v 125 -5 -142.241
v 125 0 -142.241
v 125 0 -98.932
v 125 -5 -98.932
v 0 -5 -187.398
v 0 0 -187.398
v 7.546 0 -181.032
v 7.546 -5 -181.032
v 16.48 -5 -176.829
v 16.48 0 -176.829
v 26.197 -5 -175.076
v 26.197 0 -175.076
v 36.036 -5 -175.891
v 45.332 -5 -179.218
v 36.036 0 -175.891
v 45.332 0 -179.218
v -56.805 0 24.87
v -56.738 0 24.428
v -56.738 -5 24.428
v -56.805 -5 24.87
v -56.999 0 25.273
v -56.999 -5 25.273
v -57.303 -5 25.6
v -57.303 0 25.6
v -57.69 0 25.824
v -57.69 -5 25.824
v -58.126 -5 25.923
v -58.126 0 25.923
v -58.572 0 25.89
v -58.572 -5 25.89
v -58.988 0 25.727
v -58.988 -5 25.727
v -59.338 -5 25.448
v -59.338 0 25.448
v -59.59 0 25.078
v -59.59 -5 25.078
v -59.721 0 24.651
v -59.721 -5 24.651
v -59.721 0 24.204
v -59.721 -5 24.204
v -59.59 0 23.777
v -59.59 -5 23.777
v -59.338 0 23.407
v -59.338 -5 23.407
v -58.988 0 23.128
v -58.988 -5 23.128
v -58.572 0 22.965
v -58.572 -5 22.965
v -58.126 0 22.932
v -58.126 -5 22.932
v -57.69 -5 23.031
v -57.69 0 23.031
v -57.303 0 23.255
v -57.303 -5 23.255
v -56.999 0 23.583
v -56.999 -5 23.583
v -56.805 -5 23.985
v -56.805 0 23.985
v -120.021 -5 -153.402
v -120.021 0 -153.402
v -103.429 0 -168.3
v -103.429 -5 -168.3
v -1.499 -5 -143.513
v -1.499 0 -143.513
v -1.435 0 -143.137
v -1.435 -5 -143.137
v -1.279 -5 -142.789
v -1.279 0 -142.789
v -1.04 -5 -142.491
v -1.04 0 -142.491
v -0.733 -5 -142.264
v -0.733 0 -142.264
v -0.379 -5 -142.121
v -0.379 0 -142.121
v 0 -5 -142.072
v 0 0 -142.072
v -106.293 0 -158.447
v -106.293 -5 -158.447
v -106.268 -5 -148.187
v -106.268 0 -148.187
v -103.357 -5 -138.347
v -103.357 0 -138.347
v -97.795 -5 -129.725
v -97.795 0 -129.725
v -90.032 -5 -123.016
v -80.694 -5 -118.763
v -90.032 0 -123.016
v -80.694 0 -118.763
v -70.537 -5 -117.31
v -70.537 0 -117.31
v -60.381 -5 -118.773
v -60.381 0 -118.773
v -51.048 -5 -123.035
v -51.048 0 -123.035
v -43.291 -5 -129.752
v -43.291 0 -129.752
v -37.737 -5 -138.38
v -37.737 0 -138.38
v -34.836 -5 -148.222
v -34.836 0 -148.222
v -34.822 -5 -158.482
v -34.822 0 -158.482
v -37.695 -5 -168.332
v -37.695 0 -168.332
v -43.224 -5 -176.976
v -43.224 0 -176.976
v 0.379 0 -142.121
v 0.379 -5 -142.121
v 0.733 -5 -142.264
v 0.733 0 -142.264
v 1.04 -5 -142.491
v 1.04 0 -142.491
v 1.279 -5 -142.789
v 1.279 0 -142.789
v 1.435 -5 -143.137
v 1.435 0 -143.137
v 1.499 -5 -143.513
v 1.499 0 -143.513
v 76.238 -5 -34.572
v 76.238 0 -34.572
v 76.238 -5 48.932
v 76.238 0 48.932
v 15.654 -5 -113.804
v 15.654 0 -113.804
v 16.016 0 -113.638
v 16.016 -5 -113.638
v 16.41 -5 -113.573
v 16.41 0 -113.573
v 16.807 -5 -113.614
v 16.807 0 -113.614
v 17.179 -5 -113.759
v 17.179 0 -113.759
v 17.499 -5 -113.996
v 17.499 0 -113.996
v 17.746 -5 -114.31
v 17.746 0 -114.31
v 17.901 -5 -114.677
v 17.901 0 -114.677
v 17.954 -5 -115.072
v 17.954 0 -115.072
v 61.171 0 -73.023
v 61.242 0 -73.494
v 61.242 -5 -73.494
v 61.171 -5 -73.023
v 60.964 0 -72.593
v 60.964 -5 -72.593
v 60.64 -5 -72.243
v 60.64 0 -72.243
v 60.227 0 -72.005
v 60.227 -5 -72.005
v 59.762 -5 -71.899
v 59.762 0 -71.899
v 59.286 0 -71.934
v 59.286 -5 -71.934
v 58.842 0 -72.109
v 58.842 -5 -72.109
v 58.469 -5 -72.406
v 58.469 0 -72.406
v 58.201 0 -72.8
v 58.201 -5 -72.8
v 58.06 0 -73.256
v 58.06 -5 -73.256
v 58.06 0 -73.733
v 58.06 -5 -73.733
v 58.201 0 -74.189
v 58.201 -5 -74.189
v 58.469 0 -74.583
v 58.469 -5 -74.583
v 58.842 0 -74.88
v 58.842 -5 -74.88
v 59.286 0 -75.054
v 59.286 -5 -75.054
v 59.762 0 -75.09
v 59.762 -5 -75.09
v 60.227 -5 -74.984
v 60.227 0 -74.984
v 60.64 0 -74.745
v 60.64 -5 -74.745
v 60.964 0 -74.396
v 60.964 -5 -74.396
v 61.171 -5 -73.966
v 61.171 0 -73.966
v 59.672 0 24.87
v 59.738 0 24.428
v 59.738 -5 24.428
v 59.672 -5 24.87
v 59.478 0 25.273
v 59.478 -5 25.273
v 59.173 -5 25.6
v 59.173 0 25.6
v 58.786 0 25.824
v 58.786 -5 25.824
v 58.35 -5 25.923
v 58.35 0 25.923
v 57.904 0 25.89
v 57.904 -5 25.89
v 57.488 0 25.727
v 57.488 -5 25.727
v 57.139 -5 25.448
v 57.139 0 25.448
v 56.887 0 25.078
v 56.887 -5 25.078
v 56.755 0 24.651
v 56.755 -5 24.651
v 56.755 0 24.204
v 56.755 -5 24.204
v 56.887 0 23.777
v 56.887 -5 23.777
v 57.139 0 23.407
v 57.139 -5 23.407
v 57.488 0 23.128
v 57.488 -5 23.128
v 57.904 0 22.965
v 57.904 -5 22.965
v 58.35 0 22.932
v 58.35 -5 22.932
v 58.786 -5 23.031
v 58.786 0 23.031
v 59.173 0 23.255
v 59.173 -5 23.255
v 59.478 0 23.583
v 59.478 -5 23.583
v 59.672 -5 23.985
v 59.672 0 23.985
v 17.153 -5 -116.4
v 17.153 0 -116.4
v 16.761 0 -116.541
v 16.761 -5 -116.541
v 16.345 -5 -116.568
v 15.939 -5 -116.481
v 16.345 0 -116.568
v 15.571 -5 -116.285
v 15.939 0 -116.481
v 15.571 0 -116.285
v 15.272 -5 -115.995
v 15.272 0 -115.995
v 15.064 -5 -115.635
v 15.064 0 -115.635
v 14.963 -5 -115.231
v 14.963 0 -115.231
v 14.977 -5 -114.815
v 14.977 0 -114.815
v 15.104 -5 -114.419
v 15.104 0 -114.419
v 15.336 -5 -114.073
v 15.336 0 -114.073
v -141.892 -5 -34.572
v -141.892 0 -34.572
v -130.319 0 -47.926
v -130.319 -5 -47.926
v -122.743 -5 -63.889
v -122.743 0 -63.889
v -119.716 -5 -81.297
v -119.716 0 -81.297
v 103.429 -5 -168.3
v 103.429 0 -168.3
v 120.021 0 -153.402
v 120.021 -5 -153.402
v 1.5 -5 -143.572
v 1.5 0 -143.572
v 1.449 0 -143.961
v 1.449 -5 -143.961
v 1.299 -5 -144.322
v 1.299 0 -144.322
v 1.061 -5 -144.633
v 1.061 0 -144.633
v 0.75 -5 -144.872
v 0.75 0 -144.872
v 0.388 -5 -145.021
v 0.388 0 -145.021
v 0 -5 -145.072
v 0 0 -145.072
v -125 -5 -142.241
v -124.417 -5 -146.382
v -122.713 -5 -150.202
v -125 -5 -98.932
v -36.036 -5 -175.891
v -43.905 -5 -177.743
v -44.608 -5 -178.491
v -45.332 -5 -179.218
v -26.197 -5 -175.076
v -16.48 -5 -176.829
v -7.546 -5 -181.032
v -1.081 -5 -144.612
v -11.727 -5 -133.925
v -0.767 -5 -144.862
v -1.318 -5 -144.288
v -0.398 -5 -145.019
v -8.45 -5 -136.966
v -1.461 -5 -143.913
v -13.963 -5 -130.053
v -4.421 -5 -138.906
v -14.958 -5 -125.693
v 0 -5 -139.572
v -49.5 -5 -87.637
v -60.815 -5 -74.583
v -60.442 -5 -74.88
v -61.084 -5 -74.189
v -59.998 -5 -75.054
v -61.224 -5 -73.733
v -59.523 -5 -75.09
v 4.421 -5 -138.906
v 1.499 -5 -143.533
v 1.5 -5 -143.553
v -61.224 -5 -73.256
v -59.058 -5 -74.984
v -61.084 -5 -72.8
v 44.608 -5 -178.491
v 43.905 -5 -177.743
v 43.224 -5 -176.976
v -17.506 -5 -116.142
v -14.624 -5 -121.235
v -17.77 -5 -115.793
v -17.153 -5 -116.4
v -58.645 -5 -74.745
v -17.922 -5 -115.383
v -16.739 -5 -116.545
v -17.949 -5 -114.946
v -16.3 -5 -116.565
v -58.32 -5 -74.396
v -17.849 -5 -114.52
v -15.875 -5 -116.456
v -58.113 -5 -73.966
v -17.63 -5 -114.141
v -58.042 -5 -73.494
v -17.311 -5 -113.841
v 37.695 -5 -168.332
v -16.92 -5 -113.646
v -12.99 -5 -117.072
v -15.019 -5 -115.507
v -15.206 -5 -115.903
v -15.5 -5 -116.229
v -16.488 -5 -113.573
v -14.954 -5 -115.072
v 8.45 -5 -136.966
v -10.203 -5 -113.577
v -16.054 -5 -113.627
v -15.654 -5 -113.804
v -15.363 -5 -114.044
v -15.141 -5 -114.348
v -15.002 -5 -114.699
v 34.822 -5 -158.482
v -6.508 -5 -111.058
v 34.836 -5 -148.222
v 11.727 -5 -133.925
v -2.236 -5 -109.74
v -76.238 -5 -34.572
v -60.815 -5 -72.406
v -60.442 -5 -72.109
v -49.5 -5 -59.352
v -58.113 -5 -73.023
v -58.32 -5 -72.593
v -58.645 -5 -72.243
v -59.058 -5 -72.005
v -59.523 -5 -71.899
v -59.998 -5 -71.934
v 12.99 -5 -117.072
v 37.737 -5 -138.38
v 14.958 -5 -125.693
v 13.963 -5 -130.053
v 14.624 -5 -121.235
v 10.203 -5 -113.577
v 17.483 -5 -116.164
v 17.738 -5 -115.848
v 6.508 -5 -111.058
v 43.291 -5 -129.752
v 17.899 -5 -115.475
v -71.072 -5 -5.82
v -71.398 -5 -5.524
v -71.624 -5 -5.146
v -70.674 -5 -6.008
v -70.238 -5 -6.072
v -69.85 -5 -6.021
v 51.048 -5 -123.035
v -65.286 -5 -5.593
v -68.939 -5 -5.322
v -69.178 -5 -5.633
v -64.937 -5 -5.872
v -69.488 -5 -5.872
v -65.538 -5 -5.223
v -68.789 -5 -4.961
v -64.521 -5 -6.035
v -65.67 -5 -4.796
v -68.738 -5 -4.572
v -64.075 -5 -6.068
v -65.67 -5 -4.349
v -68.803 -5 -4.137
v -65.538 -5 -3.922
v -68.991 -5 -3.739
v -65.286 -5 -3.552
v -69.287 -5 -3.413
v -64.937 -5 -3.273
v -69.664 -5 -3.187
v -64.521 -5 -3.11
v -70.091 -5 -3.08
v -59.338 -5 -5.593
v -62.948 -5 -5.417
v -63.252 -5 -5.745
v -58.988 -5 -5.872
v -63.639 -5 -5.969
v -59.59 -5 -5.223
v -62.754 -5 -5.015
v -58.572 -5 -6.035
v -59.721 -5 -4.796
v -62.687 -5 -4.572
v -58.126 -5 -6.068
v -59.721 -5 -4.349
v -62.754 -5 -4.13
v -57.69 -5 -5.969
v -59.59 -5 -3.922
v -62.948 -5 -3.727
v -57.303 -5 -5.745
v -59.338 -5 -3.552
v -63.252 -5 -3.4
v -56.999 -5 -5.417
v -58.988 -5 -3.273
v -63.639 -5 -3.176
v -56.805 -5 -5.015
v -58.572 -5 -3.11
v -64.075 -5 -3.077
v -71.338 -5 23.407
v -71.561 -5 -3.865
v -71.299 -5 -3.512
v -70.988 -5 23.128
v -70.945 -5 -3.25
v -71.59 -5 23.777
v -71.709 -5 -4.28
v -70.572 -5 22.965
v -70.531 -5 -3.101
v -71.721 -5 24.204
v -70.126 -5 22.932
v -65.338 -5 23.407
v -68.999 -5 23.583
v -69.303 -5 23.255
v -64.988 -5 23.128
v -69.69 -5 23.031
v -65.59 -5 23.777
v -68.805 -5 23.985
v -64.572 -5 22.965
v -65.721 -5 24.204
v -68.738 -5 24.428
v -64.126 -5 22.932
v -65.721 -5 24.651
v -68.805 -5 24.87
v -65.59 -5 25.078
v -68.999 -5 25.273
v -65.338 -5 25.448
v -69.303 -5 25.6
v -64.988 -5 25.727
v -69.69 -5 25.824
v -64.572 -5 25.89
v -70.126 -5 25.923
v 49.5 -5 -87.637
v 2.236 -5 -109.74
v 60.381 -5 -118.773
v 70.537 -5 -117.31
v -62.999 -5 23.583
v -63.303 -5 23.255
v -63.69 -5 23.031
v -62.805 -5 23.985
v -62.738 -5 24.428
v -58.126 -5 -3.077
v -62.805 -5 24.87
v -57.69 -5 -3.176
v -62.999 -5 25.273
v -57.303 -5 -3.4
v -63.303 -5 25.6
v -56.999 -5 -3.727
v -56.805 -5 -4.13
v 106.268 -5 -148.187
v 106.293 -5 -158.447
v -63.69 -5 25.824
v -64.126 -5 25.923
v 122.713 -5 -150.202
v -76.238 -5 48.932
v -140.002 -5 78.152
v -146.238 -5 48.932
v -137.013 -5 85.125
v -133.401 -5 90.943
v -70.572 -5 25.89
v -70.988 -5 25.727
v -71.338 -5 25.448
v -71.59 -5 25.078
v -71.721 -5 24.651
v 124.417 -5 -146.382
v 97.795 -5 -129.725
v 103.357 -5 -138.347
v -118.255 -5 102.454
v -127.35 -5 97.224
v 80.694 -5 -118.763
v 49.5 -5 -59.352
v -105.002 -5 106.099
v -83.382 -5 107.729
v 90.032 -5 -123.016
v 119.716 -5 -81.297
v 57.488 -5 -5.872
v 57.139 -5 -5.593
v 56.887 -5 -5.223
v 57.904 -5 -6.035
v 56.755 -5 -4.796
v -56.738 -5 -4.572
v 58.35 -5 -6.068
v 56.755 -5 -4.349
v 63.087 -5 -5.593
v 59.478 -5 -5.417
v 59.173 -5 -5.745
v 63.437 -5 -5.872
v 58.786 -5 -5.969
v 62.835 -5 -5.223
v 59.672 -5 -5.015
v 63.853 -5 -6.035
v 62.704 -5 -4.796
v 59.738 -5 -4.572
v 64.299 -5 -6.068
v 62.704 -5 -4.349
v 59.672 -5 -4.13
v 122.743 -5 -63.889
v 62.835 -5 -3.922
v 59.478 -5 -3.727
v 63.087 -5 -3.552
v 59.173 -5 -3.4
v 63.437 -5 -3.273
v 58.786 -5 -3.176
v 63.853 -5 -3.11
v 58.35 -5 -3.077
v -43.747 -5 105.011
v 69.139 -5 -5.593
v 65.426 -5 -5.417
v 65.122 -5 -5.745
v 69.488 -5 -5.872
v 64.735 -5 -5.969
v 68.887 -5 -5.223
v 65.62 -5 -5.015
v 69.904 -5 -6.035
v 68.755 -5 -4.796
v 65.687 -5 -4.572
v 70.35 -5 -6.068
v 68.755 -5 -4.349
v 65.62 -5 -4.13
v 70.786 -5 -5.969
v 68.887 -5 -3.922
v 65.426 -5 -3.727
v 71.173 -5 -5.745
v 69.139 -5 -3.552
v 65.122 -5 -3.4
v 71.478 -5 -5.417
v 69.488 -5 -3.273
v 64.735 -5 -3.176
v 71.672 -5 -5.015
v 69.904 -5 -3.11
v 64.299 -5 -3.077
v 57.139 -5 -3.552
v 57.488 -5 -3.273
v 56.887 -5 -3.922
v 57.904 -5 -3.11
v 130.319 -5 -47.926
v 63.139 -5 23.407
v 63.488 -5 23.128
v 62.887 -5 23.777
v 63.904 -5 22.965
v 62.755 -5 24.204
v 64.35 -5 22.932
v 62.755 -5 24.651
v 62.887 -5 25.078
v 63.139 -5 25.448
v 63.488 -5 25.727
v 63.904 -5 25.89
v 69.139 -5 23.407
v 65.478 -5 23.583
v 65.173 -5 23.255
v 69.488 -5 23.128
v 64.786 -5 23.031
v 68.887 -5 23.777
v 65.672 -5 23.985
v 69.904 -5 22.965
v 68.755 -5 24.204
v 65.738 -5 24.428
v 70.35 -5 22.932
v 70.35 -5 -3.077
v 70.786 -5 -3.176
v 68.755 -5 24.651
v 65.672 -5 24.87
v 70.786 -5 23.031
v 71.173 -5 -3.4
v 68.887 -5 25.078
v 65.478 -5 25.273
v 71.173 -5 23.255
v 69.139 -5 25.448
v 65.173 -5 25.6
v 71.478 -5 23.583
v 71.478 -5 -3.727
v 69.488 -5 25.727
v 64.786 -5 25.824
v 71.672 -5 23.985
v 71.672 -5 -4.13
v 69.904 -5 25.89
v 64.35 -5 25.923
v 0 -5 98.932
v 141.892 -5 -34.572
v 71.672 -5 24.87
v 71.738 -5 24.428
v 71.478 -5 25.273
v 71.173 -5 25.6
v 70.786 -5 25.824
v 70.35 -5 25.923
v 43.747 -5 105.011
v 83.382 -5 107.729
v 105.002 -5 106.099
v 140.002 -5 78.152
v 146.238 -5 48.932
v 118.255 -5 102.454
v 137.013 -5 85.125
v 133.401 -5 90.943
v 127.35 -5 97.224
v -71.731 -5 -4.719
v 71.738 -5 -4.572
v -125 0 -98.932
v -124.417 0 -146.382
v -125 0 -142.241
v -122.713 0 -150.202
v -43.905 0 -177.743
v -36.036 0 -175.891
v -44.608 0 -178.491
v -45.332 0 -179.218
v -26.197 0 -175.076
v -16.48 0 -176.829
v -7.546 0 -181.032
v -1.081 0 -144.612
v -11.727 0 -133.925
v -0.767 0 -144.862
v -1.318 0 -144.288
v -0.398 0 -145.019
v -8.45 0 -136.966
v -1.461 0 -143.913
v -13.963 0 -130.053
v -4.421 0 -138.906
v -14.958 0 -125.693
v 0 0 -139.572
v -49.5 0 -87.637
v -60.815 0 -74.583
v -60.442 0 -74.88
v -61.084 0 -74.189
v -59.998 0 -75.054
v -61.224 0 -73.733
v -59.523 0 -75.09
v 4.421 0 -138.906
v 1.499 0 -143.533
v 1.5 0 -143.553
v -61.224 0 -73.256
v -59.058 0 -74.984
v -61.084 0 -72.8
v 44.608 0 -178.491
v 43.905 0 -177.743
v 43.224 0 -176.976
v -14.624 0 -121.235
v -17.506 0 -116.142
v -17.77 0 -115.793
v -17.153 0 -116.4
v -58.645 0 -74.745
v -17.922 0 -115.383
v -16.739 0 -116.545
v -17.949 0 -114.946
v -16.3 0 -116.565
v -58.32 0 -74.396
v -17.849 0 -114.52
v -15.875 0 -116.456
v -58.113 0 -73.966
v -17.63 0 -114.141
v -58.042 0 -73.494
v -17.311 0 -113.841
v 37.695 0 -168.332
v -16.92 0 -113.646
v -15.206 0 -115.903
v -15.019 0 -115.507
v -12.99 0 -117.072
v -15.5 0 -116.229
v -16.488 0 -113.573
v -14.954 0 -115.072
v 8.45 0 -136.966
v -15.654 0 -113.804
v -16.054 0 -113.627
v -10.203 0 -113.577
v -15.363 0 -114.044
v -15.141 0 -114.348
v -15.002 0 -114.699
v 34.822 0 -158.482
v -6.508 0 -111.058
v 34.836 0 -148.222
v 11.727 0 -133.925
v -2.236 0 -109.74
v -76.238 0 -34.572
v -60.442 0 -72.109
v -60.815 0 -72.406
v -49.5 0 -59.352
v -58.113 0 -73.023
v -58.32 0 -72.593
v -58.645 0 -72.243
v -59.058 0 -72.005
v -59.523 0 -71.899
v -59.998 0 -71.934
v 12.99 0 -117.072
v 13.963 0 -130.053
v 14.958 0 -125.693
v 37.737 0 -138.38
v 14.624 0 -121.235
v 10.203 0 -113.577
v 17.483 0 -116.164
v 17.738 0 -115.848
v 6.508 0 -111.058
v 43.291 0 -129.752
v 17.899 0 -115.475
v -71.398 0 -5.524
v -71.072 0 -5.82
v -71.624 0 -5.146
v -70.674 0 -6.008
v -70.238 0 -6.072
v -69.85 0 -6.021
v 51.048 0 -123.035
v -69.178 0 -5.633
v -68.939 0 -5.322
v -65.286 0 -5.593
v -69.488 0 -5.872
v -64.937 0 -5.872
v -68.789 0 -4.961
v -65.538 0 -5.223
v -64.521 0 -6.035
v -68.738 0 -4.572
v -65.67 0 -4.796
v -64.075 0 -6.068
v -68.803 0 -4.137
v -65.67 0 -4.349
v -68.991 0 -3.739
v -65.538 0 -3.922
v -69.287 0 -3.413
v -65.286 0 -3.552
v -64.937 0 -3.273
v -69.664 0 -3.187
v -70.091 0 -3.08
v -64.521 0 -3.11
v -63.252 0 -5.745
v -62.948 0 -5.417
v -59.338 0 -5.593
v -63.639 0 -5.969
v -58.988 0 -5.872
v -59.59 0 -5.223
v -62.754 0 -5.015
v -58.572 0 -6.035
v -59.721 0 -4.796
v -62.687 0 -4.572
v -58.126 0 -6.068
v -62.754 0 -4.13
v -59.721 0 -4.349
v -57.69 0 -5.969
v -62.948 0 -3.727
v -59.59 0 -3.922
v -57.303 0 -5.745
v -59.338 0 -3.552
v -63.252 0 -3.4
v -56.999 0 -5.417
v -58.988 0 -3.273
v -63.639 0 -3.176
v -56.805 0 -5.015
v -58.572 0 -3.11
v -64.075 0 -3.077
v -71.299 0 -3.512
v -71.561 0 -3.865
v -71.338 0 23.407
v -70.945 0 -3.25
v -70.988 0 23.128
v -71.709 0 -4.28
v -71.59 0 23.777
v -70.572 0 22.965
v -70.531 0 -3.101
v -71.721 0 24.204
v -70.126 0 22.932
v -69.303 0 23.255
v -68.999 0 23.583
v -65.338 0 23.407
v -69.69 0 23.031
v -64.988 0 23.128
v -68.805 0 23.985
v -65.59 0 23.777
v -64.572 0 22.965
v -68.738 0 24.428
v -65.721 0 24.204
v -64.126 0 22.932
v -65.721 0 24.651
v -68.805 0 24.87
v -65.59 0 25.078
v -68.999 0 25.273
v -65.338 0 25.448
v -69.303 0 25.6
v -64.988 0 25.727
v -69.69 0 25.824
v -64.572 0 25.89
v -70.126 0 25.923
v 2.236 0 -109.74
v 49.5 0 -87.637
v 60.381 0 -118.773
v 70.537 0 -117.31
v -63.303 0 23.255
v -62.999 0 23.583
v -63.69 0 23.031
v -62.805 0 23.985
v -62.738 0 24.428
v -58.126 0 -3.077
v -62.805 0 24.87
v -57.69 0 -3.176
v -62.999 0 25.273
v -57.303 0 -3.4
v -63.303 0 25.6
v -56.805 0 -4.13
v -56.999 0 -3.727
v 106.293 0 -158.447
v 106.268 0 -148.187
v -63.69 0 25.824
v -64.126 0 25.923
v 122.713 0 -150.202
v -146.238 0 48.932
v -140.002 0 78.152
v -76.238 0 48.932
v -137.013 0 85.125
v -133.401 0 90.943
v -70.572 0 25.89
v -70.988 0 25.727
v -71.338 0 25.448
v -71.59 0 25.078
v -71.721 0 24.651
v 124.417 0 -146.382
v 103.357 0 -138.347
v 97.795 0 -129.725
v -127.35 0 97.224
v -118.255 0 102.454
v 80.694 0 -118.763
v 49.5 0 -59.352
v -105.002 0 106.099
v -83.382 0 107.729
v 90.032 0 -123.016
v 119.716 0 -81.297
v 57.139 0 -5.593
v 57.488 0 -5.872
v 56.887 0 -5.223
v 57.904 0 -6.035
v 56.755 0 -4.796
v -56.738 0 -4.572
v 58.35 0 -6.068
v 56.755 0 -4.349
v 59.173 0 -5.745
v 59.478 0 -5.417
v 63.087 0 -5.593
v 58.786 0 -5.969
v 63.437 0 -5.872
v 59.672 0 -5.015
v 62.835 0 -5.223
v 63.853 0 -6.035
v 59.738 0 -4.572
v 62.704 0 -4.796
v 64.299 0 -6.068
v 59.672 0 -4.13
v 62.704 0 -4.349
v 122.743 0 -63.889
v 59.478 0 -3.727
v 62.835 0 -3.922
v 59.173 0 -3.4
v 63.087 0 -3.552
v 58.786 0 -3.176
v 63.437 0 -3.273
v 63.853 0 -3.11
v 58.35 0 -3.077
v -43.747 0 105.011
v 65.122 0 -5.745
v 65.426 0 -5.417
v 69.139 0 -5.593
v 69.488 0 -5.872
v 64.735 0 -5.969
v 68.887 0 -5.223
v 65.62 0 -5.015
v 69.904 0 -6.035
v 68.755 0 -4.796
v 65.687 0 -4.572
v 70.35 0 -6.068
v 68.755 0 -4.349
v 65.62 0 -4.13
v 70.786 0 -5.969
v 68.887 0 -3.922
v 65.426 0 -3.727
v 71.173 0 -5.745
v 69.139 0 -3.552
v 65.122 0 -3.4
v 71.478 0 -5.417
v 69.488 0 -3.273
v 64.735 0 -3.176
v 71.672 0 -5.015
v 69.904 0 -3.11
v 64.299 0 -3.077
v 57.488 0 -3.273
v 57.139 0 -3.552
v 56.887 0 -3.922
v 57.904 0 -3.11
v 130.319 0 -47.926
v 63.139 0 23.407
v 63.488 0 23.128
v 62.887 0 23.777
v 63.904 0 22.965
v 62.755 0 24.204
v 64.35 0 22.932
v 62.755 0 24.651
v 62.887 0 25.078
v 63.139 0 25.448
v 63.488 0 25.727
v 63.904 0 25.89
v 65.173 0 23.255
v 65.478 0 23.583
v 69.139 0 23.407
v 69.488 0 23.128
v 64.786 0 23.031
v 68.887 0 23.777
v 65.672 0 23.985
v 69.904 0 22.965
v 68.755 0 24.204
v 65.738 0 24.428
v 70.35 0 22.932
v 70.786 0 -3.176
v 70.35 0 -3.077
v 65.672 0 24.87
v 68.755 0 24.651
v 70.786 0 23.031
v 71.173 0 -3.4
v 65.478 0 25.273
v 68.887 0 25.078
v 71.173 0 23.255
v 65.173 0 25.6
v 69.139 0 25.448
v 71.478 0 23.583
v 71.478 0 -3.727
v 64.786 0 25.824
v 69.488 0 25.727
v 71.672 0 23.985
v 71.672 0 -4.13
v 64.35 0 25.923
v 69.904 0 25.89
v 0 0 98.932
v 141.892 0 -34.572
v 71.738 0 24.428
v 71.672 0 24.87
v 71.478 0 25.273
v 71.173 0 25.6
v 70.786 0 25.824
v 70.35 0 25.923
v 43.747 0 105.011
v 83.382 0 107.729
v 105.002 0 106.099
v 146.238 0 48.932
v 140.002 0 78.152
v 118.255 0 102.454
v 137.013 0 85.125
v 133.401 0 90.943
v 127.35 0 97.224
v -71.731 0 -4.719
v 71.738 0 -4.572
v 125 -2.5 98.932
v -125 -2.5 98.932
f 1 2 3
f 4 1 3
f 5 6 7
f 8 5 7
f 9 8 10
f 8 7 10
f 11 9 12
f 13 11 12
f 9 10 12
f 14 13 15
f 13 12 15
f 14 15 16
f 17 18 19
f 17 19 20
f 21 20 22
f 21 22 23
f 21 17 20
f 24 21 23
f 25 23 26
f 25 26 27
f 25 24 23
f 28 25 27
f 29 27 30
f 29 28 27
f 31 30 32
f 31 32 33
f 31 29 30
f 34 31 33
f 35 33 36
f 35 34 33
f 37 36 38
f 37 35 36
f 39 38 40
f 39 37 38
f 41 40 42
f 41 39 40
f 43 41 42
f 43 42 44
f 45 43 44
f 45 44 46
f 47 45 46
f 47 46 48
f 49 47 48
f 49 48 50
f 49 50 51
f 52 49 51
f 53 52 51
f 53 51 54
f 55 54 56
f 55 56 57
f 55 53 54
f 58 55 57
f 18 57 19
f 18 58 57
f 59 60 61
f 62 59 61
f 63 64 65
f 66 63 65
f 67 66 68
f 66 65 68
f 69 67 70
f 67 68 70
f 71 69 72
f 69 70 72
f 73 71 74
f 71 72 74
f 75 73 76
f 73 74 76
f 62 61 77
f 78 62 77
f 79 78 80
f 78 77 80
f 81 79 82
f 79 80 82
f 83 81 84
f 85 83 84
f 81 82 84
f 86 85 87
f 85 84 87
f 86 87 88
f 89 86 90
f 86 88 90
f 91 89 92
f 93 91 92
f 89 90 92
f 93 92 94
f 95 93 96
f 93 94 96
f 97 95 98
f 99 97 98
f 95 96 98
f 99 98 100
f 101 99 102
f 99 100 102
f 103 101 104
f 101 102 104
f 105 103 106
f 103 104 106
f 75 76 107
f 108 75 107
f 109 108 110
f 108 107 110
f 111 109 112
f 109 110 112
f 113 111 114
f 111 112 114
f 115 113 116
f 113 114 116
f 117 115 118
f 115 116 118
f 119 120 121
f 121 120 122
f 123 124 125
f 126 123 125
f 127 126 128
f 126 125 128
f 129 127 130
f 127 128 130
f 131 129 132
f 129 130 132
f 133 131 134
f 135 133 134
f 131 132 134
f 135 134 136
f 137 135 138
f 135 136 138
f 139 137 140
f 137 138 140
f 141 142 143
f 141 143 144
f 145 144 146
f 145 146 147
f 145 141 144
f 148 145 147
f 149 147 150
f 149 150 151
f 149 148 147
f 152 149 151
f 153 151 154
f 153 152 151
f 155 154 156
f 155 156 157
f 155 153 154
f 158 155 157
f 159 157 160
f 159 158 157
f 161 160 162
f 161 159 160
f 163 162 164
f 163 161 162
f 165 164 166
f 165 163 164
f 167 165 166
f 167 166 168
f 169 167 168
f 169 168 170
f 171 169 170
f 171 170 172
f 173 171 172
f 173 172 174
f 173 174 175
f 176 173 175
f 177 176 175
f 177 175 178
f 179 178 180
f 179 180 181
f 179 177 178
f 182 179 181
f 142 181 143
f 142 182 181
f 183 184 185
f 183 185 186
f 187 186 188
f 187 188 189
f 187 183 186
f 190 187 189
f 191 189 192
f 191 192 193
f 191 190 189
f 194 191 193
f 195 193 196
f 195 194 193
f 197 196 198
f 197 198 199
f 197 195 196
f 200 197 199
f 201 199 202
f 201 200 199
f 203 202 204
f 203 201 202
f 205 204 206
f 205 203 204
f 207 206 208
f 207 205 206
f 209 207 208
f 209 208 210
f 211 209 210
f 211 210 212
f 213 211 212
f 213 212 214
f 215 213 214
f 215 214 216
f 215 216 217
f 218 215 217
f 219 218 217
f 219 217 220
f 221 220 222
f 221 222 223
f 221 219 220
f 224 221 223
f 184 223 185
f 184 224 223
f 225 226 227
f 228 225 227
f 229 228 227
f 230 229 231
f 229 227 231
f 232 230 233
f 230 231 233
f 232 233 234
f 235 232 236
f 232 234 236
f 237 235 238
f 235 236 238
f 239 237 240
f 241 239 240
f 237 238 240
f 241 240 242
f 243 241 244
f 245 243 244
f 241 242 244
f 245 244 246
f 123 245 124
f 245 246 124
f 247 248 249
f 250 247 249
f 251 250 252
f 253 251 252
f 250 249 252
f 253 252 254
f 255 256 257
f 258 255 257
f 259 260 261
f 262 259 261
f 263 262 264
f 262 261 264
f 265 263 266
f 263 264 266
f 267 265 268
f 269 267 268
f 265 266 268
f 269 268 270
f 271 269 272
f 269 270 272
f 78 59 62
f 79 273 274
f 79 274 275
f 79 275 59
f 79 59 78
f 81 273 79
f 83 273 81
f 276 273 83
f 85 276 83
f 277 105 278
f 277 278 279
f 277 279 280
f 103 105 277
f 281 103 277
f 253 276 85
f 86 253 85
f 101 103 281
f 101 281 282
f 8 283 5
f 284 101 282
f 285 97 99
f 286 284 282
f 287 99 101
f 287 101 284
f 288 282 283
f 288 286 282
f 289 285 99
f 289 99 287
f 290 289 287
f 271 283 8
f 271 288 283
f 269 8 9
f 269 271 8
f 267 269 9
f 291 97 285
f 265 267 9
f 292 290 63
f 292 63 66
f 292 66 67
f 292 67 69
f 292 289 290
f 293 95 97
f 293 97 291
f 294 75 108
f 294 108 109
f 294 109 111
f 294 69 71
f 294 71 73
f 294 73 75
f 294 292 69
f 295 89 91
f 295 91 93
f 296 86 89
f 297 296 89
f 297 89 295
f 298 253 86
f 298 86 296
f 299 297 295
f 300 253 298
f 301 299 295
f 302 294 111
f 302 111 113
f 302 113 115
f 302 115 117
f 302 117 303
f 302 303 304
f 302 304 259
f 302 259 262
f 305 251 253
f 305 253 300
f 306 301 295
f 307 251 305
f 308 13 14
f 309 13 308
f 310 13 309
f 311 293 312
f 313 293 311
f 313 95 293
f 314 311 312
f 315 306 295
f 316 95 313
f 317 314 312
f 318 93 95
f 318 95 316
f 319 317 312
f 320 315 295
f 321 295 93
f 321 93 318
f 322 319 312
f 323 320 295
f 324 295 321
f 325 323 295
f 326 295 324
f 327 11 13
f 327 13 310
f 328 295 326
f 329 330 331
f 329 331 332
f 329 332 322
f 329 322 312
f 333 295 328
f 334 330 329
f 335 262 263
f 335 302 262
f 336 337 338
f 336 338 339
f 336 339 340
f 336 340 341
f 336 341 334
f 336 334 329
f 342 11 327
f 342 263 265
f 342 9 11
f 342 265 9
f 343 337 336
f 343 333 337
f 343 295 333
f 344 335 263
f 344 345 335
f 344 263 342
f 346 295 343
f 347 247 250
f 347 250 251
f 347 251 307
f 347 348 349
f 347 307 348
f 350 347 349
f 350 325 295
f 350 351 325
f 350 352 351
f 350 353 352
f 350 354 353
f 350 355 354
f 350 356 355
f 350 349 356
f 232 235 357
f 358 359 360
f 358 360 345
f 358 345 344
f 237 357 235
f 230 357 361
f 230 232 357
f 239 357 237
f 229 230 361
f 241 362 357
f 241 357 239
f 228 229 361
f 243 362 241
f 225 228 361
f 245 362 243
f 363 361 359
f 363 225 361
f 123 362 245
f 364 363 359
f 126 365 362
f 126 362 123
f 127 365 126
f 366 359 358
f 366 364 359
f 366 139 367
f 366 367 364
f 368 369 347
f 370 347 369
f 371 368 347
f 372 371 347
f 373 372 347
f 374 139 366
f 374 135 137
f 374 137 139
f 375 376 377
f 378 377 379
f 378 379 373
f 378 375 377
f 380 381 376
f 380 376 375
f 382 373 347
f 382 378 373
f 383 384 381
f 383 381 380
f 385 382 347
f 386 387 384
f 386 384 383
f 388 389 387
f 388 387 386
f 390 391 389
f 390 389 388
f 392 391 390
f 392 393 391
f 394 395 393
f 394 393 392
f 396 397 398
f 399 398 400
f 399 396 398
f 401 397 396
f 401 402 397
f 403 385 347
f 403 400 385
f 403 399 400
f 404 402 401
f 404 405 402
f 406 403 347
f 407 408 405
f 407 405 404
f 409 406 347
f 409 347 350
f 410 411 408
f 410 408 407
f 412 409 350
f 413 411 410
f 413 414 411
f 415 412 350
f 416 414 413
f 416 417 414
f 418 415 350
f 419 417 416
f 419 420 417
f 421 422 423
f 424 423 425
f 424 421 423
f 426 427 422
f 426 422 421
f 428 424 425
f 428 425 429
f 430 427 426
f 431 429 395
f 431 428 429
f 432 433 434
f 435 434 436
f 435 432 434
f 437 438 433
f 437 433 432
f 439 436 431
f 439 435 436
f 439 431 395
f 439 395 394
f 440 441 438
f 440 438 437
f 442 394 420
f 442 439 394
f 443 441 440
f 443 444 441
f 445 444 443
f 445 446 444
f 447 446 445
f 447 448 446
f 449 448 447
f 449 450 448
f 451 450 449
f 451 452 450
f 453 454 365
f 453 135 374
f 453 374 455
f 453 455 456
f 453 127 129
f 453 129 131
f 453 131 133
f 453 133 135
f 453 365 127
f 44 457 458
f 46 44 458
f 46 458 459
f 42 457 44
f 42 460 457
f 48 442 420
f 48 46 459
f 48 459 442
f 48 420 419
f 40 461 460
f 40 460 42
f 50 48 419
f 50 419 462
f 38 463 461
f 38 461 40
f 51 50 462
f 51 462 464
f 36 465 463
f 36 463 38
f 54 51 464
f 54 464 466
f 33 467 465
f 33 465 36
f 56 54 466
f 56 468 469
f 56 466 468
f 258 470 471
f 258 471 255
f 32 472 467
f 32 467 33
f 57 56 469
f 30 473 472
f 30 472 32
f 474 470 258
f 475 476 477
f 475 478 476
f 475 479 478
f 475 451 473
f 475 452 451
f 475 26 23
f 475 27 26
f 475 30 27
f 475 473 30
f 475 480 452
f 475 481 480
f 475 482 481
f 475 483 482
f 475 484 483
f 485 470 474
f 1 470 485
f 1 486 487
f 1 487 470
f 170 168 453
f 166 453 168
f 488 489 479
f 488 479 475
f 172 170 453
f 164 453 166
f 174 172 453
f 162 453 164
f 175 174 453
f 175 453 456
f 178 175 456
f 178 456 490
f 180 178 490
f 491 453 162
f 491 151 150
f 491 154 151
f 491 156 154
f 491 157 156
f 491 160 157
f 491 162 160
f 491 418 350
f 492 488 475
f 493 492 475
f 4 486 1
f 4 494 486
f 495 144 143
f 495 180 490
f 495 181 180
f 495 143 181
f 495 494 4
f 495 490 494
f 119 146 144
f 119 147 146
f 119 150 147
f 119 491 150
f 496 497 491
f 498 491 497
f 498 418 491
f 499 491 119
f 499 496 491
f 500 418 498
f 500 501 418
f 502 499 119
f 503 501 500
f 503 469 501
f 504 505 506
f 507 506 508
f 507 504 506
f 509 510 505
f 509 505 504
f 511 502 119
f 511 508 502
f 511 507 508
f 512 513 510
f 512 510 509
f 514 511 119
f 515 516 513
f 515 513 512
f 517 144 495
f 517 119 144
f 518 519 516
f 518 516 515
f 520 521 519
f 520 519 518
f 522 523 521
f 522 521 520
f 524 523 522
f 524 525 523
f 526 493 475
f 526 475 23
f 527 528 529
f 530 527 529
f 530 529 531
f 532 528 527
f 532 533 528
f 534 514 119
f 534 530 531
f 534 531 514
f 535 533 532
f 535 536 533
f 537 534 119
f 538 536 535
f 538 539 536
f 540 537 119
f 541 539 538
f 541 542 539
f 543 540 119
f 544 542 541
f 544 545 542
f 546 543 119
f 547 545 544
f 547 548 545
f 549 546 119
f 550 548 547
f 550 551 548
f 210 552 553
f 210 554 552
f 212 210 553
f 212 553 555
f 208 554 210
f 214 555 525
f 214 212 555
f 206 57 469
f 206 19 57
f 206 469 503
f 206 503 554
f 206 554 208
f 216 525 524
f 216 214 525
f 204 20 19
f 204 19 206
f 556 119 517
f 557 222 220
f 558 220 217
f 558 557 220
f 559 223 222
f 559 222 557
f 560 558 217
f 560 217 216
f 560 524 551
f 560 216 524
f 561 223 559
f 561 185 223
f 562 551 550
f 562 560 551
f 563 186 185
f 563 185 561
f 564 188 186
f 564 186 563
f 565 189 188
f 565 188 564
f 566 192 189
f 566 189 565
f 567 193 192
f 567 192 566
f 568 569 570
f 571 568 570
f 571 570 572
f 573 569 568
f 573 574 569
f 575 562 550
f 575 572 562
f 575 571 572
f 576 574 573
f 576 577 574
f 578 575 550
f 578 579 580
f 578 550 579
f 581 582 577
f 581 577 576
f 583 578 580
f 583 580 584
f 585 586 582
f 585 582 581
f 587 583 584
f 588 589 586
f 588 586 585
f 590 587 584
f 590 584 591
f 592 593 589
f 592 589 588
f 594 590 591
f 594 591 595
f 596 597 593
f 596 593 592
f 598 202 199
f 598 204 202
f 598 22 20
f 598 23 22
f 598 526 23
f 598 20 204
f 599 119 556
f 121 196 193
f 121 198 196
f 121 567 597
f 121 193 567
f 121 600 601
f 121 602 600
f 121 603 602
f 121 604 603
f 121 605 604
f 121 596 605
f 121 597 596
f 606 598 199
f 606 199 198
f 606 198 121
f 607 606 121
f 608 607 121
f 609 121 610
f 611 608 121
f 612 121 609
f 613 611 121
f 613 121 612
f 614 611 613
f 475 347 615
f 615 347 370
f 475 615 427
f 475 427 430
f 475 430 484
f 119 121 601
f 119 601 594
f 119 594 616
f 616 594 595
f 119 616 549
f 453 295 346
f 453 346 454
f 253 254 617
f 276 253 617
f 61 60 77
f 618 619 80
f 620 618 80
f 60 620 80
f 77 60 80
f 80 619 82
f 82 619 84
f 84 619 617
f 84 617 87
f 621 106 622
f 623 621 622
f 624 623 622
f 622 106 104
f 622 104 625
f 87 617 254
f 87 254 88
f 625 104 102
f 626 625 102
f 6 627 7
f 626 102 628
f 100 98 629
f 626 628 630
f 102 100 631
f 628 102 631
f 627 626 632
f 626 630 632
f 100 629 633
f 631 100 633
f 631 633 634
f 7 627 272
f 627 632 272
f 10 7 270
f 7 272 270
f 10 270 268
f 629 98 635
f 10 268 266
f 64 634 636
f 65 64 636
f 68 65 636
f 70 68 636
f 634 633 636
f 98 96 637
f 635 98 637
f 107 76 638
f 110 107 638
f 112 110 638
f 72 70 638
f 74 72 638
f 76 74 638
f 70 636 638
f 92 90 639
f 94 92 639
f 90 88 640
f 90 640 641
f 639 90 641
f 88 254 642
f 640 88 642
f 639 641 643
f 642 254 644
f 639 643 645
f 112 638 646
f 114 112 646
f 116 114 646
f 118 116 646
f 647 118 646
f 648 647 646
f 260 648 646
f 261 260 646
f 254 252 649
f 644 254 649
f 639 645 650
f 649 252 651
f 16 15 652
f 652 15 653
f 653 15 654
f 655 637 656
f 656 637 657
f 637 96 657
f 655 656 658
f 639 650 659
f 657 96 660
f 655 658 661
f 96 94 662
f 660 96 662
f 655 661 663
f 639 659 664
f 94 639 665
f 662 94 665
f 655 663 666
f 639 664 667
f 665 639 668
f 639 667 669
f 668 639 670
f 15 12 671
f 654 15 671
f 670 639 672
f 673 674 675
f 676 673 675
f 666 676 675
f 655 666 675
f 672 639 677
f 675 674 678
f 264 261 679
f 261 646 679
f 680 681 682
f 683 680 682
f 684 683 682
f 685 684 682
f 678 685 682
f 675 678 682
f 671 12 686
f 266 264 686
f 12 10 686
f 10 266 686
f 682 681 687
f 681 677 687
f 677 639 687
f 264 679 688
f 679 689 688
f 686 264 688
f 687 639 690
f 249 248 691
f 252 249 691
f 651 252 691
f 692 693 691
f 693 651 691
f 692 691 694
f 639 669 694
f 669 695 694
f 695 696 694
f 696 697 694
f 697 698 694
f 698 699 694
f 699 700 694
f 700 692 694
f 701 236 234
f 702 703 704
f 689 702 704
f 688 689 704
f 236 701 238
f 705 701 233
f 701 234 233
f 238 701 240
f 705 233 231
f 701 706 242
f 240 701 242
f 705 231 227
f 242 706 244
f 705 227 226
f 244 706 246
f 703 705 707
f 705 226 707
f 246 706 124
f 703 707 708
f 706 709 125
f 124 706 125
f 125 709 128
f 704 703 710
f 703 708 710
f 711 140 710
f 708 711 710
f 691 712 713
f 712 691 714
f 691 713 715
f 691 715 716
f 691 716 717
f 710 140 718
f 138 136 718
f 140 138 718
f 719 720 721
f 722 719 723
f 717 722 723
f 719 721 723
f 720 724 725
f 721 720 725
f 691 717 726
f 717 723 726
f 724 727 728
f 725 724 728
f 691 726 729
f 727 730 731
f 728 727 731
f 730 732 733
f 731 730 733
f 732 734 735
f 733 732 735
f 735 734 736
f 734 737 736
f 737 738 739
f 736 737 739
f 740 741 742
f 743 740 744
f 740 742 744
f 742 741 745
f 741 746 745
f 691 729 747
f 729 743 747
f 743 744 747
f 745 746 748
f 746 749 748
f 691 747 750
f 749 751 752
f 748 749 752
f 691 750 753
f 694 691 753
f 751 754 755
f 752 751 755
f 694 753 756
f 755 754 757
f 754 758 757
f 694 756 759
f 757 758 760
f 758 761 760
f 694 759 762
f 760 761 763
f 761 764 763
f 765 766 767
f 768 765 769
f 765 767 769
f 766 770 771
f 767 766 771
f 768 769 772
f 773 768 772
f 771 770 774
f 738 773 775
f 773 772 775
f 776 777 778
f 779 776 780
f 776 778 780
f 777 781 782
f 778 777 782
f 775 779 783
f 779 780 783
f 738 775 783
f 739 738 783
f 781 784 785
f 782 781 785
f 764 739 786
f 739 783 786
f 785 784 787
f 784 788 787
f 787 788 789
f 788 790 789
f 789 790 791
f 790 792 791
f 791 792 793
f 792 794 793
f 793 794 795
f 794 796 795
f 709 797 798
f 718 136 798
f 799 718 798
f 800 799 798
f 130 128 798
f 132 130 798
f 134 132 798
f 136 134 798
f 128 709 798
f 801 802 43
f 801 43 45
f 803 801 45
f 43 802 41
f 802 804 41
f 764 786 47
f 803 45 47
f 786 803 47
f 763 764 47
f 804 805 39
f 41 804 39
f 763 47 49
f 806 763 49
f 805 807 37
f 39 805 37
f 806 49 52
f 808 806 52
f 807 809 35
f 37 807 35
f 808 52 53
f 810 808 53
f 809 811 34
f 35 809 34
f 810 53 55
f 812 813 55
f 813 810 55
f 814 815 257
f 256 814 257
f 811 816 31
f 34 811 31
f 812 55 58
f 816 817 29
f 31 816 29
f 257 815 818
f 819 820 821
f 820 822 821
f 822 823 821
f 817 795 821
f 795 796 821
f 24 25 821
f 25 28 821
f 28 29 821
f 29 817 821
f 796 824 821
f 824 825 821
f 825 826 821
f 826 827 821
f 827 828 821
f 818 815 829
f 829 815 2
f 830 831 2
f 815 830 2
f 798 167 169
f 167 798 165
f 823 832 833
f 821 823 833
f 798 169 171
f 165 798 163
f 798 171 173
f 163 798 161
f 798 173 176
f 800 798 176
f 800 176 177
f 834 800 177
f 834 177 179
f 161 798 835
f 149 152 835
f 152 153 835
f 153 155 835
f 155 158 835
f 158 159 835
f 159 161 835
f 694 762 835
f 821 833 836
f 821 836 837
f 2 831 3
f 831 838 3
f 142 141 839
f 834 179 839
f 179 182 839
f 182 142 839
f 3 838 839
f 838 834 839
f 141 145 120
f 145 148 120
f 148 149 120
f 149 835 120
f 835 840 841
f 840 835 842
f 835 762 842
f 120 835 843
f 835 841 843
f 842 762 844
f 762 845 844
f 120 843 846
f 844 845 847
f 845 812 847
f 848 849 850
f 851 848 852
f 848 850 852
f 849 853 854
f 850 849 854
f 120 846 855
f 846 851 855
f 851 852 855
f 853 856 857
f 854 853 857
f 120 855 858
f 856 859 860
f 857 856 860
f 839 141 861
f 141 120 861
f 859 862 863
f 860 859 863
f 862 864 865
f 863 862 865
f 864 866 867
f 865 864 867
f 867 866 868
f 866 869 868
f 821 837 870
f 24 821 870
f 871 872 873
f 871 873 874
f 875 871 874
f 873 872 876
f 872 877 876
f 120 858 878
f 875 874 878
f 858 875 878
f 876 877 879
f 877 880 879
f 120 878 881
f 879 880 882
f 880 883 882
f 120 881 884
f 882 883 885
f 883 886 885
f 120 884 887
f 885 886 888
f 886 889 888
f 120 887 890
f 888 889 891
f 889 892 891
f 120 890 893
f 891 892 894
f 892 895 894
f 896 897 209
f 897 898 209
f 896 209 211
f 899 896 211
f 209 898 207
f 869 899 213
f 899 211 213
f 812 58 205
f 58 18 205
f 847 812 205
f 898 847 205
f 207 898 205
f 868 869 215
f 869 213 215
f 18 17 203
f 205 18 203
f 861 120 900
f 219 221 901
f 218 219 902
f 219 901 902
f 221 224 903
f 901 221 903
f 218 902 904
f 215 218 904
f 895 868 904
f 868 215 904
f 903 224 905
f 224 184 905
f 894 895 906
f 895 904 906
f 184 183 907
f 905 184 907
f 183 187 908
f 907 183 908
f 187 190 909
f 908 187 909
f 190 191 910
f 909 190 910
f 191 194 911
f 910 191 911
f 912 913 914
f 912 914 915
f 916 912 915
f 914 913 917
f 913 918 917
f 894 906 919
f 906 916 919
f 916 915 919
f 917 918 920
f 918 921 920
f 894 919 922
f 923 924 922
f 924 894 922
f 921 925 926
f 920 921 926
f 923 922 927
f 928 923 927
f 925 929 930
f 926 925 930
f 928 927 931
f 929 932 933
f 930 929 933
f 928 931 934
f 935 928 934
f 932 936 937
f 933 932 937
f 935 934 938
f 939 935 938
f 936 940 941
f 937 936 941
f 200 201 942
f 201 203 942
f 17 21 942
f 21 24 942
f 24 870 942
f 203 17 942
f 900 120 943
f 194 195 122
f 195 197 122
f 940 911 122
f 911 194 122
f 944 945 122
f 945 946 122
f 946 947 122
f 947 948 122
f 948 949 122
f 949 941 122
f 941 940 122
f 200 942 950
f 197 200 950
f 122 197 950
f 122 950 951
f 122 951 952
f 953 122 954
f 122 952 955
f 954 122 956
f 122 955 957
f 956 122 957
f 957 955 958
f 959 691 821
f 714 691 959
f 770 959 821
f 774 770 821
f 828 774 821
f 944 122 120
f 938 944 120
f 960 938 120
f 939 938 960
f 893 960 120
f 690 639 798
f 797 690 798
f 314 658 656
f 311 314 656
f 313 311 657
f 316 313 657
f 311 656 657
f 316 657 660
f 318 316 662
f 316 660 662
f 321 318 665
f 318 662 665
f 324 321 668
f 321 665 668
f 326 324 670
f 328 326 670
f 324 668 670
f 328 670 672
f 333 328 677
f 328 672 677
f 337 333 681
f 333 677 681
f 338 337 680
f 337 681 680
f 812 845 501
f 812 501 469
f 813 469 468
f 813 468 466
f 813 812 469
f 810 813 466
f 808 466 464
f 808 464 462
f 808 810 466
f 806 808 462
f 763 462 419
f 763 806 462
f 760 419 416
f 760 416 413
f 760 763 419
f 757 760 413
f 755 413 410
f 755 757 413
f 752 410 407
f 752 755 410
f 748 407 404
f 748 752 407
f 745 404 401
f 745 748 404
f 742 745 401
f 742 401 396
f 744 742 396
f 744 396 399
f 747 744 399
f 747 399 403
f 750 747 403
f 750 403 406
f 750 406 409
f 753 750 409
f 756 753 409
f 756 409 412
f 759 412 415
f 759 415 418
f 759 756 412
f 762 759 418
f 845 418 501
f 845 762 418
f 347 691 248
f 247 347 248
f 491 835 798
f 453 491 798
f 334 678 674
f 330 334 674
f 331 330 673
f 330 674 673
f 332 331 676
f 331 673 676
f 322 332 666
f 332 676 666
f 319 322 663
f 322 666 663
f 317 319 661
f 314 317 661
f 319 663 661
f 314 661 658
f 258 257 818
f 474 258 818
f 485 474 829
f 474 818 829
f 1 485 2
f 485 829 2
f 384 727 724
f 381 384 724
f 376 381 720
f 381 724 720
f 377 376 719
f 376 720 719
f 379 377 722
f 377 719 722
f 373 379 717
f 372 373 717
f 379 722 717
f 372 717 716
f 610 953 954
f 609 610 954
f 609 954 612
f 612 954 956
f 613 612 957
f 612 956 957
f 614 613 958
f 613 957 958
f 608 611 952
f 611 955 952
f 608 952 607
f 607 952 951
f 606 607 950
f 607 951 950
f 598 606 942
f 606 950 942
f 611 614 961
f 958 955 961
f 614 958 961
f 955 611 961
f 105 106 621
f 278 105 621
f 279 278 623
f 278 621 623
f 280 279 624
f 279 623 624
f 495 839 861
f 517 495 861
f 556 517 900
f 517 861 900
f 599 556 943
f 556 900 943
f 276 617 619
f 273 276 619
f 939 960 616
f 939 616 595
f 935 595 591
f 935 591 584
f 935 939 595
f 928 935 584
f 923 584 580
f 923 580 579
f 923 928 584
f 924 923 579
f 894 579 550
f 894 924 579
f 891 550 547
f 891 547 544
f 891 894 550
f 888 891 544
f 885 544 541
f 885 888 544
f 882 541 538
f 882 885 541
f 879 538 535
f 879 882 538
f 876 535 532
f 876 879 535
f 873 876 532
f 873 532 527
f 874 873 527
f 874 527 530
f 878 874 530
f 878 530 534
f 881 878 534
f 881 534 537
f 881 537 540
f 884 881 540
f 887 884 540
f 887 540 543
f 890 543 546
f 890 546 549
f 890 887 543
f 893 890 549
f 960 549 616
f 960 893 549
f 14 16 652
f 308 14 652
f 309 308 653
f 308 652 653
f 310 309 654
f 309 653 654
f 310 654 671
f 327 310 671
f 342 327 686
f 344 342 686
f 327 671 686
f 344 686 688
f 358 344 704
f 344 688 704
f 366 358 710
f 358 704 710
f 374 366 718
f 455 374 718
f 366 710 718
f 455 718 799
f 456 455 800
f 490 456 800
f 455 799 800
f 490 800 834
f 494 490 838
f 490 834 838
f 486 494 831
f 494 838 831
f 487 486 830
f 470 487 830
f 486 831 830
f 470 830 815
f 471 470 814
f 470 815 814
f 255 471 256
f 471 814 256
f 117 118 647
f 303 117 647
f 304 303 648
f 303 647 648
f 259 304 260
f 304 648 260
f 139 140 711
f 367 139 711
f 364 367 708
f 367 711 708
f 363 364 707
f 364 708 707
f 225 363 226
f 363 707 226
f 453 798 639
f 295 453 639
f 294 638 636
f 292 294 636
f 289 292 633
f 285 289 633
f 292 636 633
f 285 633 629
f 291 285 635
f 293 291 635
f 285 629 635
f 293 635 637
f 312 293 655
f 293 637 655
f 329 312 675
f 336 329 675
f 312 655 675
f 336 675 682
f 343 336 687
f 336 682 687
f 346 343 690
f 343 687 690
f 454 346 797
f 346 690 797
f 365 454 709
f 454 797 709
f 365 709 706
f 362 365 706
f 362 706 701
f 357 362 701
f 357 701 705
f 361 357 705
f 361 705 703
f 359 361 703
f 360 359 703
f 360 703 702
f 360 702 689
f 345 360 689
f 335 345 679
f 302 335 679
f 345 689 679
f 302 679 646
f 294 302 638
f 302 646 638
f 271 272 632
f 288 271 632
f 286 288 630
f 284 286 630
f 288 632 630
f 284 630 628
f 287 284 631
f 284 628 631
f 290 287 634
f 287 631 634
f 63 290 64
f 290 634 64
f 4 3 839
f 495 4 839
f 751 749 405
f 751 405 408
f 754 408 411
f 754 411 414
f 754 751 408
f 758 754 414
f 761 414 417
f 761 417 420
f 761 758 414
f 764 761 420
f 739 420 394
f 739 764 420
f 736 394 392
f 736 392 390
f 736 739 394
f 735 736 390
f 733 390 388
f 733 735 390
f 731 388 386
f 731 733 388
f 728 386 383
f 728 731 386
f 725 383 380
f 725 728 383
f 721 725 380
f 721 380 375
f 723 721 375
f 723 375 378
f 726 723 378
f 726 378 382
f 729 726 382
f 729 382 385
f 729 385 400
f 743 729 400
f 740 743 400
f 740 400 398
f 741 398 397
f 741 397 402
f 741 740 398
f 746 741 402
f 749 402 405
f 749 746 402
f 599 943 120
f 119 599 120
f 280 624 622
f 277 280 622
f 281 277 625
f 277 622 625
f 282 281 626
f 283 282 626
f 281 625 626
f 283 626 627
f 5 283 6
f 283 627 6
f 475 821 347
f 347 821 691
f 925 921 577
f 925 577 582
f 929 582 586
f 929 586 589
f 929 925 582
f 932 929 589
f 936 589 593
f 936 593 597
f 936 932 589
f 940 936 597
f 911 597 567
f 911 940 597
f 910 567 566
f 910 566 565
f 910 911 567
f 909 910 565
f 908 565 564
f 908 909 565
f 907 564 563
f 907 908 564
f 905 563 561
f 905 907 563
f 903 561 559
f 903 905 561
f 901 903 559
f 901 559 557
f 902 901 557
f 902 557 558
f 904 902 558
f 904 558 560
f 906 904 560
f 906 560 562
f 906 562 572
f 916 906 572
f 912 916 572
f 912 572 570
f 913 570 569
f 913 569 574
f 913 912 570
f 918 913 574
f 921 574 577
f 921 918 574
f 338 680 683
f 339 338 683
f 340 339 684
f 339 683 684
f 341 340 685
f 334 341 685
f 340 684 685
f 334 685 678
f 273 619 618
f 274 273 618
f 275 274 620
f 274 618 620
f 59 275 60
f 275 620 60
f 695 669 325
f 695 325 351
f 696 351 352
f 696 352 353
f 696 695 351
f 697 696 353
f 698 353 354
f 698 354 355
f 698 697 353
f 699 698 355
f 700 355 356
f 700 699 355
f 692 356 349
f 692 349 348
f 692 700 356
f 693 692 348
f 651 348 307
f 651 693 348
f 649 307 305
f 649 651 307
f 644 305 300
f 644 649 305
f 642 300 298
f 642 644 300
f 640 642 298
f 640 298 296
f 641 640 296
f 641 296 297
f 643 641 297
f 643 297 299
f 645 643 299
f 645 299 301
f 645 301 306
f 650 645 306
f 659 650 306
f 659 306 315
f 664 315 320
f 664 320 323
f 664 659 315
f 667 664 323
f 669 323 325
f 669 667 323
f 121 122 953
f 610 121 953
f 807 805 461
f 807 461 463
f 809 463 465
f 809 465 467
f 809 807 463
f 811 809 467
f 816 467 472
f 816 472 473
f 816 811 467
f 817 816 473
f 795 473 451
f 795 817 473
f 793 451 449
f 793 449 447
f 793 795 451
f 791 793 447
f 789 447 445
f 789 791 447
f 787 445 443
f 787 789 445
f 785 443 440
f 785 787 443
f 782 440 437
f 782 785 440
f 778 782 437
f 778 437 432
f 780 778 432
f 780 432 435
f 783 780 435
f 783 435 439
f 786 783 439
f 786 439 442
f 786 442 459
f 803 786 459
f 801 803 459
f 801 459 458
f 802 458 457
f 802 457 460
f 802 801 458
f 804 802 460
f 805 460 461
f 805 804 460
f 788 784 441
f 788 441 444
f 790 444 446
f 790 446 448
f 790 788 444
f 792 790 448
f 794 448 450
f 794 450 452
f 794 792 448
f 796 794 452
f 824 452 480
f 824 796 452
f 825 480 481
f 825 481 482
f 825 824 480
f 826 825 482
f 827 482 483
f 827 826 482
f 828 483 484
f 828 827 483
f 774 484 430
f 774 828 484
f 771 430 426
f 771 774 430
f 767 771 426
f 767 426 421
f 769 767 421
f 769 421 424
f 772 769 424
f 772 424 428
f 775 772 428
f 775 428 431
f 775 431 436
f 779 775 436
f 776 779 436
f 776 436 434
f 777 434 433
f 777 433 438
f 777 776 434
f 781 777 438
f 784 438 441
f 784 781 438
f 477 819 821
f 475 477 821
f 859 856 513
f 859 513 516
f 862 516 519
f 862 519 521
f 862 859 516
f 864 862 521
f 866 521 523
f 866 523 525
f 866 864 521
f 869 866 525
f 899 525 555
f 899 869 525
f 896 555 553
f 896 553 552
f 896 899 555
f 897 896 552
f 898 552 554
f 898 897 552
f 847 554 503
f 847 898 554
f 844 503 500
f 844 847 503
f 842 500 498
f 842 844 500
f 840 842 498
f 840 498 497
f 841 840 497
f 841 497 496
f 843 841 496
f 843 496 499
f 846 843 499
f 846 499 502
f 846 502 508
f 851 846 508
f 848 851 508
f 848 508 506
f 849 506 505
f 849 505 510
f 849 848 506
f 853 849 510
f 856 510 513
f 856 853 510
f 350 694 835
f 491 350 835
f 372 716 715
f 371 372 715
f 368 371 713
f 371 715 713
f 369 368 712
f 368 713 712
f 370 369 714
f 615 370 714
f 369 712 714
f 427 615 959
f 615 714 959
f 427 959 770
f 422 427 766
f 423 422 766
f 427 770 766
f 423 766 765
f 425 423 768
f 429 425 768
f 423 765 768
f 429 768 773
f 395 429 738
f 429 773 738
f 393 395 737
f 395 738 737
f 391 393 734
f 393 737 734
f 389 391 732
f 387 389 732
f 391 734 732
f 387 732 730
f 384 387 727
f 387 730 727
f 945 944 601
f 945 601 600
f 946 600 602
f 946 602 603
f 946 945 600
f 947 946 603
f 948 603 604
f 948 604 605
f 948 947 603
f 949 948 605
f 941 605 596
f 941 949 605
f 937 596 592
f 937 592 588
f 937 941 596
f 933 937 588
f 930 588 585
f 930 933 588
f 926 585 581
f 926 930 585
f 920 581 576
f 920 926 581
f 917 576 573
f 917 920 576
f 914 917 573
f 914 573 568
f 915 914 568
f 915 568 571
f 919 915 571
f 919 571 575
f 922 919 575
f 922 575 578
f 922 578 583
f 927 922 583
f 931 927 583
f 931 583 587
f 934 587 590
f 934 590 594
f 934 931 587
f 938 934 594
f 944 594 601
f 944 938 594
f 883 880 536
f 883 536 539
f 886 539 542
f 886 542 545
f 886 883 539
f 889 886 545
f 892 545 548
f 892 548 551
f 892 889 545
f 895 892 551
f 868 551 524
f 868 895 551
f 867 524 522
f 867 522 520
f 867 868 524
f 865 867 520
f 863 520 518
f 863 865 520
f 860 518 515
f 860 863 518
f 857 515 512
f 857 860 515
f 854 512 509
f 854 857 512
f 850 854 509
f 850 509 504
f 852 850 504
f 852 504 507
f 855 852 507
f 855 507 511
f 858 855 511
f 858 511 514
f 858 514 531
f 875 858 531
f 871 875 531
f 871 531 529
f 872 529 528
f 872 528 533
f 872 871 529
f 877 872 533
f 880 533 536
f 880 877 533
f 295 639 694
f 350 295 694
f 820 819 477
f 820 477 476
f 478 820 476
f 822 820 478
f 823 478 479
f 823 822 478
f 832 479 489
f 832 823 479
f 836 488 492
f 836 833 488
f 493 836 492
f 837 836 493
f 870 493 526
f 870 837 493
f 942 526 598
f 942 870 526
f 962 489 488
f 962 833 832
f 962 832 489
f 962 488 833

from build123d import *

# Parameters (mm, degrees)
F0_R     = 1.6
F0_R_2   = 1.5
F1_DEPTH = 5


with BuildPart() as f1:
    # F0 (on Front) → F1 (new body)
    with BuildSketch(Plane.XZ):
        with BuildLine():
            Line((0, -105.5724638663), (0, -98.9320270717))
            Line((0, -98.9320270717), (0, -87.6365141757))
            Line((0, -87.6365141757), (-49.5, -87.6365141757))
            Line((-49.5, -87.6365141757), (-49.5, -59.3522429283))
            Line((-49.5, -59.3522429283), (0, -59.3522429283))
            Line((0, -59.3522429283), (0, 98.9320270717))
            add(Edge.make_bspline(
                [(-146.2381845713, 48.9320270717), (-143.2091262015, 68.9096288331), (-135.5852518703, 119.1915008468), (-50.9865840375, 106.55056484), (0, 98.9320270717)],
                knots=[0, 0, 0, 0, 0.3973122114, 1, 1, 1, 1], degree=3))
            Line((-146.2381845713, 48.9320270717), (-125, 48.9320270717))
            Line((-125, 48.9320270717), (-76.2381845713, 48.9320270717))
            Line((-76.2381845713, 48.9320270717), (-76.2381845713, -34.5724638663))
            Line((-76.2381845713, -34.5724638663), (-141.8916900928, -34.5724638663))
            ThreePointArc((-141.8916900928, -34.5724638663), (-125.9898971587, -55.6502114599), (-119.7161859861, -81.2974142364))
            Line((-119.7161859861, -81.2974142364), (-125, -98.9320270717))
            Line((-125, -98.9320270717), (-125, -142.2410042337))
            ThreePointArc((-125, -142.2410042337), (-123.6989053151, -148.3516501216), (-120.0213342443, -153.4022254914))
            Line((-120.0213342443, -153.4022254914), (-103.4289673704, -168.3000265931))
            ThreePointArc((-103.4289673704, -168.3000265931), (-65.4068612322, -117.6788317827), (-43.2242829938, -176.9757047349))
            ThreePointArc((-43.2242829938, -176.9757047349), (-44.2540337338, -178.1193368484), (-45.3315999714, -179.2180324392))
            ThreePointArc((-45.3315999714, -179.2180324392), (-21.2811980726, -175.6350274134), (0, -187.3981207609))
            Line((0, -187.3981207609), (0, -179.2180324392))
            Line((0, -179.2180324392), (0, -145.0724638663))
            ThreePointArc((0, -145.0724638663), (-1.0813916472, -144.6119791886), (-1.4988309156, -143.51325334))
            ThreePointArc((-1.4988309156, -143.51325334), (-16.4544826719, -134.0724638663), (-17.1526203097, -116.4000947784))
            ThreePointArc((-17.1526203097, -116.4000947784), (-17.7535207776, -114.3224638663), (-15.6537893941, -113.8040434806))
            ThreePointArc((-15.6537893941, -113.8040434806), (-8.843076746, -107.755805647), (0, -105.5724638663))
        make_face()
        with Locations((-59.6421356237, -73.494378552)):
            Circle(F0_R, mode=Mode.SUBTRACT)
        with BuildLine():
            ThreePointArc((-70.2381845713, -6.0724638663), (-71.298844743, -3.5118036945), (-68.7381845713, -4.5724638663))
            ThreePointArc((-68.7381845713, -4.5724638663), (-69.1775243995, -5.6331240381), (-70.2381845713, -6.0724638663))
        make_face(mode=Mode.SUBTRACT)
        with Locations((-64.1868777356, -4.5724638663)):
            Circle(F0_R_2, mode=Mode.SUBTRACT)
        with Locations((-58.2381845713, -4.5724638663)):
            Circle(F0_R_2, mode=Mode.SUBTRACT)
        with Locations((-70.2381845713, 24.4275361337)):
            Circle(F0_R_2, mode=Mode.SUBTRACT)
        with Locations((-64.2381845713, 24.4275361337)):
            Circle(F0_R_2, mode=Mode.SUBTRACT)
        with Locations((-58.2381845713, 24.4275361337)):
            Circle(F0_R_2, mode=Mode.SUBTRACT)
        with BuildLine():
            Line((0, -87.6365141757), (0, -98.9320270717))
            Line((0, -98.9320270717), (0, -105.5724638663))
            ThreePointArc((0, -105.5724638663), (8.843076746, -107.755805647), (15.6537893941, -113.8040434806))
            ThreePointArc((15.6537893941, -113.8040434806), (17.178692615, -113.7588733828), (17.9544826719, -115.0724638663))
            ThreePointArc((17.9544826719, -115.0724638663), (17.738462122, -115.8479616237), (17.1526203097, -116.4000947784))
            ThreePointArc((17.1526203097, -116.4000947784), (18.5324011651, -120.3831790756), (19, -124.5724638663))
            ThreePointArc((19, -124.5724638663), (13.9548878067, -137.4666915013), (1.4988309156, -143.51325334))
            ThreePointArc((1.4988309156, -143.51325334), (1.4997077004, -143.542852833), (1.5, -143.5724638663))
            ThreePointArc((1.5, -143.5724638663), (1.0606601718, -144.6331240381), (0, -145.0724638663))
            Line((0, -145.0724638663), (0, -179.2180324392))
            Line((0, -179.2180324392), (0, -187.3981207609))
            ThreePointArc((0, -187.3981207609), (21.2811980726, -175.6350274134), (45.3315999714, -179.2180324392))
            ThreePointArc((45.3315999714, -179.2180324392), (44.2540337338, -178.1193368484), (43.2242829938, -176.9757047349))
            ThreePointArc((43.2242829938, -176.9757047349), (65.4068612322, -117.6788317827), (103.4289673704, -168.3000265931))
            Line((103.4289673704, -168.3000265931), (120.0213342443, -153.4022254914))
            ThreePointArc((120.0213342443, -153.4022254914), (123.6989053151, -148.3516501216), (125, -142.2410042337))
            Line((125, -142.2410042337), (125, -98.9320270717))
            Line((125, -98.9320270717), (119.7161859861, -81.2974142364))
            ThreePointArc((119.7161859861, -81.2974142364), (125.9898971587, -55.6502114599), (141.8916900928, -34.5724638663))
            Line((141.8916900928, -34.5724638663), (76.2381845713, -34.5724638663))
            Line((76.2381845713, -34.5724638663), (76.2381845713, 48.9320270717))
            Line((76.2381845713, 48.9320270717), (125, 48.9320270717))
            Line((125, 48.9320270717), (146.2381845713, 48.9320270717))
            add(Edge.make_bspline(
                [(146.2381845713, 48.9320270717), (143.2091262015, 68.9096288331), (135.5852518703, 119.1915008468), (50.9865840375, 106.55056484), (0, 98.9320270717)],
                knots=[0, 0, 0, 0, 0.3973122114, 1, 1, 1, 1], degree=3))
            Line((0, 98.9320270717), (0, -59.3522429283))
            Line((0, -59.3522429283), (49.5, -59.3522429283))
            Line((49.5, -59.3522429283), (49.5, -87.6365141757))
            Line((49.5, -87.6365141757), (0, -87.6365141757))
        make_face()
        with Locations((59.6421356237, -73.494378552)):
            Circle(F0_R, mode=Mode.SUBTRACT)
        with Locations((58.2381845713, -4.5724638663)):
            Circle(F0_R_2, mode=Mode.SUBTRACT)
        with Locations((64.1868777356, -4.5724638663)):
            Circle(F0_R_2, mode=Mode.SUBTRACT)
        with Locations((70.2381845713, -4.5724638663)):
            Circle(F0_R_2, mode=Mode.SUBTRACT)
        with Locations((58.2381845713, 24.4275361337)):
            Circle(F0_R_2, mode=Mode.SUBTRACT)
        with Locations((64.2381845713, 24.4275361337)):
            Circle(F0_R_2, mode=Mode.SUBTRACT)
        with Locations((70.2381845713, 24.4275361337)):
            Circle(F0_R_2, mode=Mode.SUBTRACT)
        with BuildLine():
            ThreePointArc((15.6537893941, -113.8040434806), (8.843076746, -107.755805647), (0, -105.5724638663))
            Line((0, -105.5724638663), (0, -109.5724638663))
            ThreePointArc((0, -109.5724638663), (10.6066017178, -113.9658621485), (15, -124.5724638663))
            ThreePointArc((15, -124.5724638663), (10.6066017178, -135.1790655841), (0, -139.5724638663))
            Line((0, -139.5724638663), (0, -142.0724638663))
            ThreePointArc((0, -142.0724638663), (1.0395153223, -142.4910722191), (1.4988309156, -143.51325334))
            ThreePointArc((1.4988309156, -143.51325334), (13.9548878067, -137.4666915013), (19, -124.5724638663))
            ThreePointArc((19, -124.5724638663), (18.5324011651, -120.3831790756), (17.1526203097, -116.4000947784))
            ThreePointArc((17.1526203097, -116.4000947784), (15.1554445662, -115.8224638663), (15.6537893941, -113.8040434806))
        make_face()
        with BuildLine():
            Line((0, -109.5724638663), (0, -105.5724638663))
            ThreePointArc((0, -105.5724638663), (-8.843076746, -107.755805647), (-15.6537893941, -113.8040434806))
            ThreePointArc((-15.6537893941, -113.8040434806), (-15.1408921884, -114.3482539232), (-14.9544826719, -115.0724638663))
            ThreePointArc((-14.9544826719, -115.0724638663), (-15.6789849146, -116.3564433165), (-17.1526203097, -116.4000947784))
            ThreePointArc((-17.1526203097, -116.4000947784), (-16.4544826719, -134.0724638663), (-1.4988309156, -143.51325334))
            ThreePointArc((-1.4988309156, -143.51325334), (-1.0395153223, -142.4910722191), (0, -142.0724638663))
            Line((0, -142.0724638663), (0, -139.5724638663))
            ThreePointArc((0, -139.5724638663), (-15, -124.5724638663), (0, -109.5724638663))
        make_face()
    extrude(amount=F1_DEPTH)


solid = f1.part
